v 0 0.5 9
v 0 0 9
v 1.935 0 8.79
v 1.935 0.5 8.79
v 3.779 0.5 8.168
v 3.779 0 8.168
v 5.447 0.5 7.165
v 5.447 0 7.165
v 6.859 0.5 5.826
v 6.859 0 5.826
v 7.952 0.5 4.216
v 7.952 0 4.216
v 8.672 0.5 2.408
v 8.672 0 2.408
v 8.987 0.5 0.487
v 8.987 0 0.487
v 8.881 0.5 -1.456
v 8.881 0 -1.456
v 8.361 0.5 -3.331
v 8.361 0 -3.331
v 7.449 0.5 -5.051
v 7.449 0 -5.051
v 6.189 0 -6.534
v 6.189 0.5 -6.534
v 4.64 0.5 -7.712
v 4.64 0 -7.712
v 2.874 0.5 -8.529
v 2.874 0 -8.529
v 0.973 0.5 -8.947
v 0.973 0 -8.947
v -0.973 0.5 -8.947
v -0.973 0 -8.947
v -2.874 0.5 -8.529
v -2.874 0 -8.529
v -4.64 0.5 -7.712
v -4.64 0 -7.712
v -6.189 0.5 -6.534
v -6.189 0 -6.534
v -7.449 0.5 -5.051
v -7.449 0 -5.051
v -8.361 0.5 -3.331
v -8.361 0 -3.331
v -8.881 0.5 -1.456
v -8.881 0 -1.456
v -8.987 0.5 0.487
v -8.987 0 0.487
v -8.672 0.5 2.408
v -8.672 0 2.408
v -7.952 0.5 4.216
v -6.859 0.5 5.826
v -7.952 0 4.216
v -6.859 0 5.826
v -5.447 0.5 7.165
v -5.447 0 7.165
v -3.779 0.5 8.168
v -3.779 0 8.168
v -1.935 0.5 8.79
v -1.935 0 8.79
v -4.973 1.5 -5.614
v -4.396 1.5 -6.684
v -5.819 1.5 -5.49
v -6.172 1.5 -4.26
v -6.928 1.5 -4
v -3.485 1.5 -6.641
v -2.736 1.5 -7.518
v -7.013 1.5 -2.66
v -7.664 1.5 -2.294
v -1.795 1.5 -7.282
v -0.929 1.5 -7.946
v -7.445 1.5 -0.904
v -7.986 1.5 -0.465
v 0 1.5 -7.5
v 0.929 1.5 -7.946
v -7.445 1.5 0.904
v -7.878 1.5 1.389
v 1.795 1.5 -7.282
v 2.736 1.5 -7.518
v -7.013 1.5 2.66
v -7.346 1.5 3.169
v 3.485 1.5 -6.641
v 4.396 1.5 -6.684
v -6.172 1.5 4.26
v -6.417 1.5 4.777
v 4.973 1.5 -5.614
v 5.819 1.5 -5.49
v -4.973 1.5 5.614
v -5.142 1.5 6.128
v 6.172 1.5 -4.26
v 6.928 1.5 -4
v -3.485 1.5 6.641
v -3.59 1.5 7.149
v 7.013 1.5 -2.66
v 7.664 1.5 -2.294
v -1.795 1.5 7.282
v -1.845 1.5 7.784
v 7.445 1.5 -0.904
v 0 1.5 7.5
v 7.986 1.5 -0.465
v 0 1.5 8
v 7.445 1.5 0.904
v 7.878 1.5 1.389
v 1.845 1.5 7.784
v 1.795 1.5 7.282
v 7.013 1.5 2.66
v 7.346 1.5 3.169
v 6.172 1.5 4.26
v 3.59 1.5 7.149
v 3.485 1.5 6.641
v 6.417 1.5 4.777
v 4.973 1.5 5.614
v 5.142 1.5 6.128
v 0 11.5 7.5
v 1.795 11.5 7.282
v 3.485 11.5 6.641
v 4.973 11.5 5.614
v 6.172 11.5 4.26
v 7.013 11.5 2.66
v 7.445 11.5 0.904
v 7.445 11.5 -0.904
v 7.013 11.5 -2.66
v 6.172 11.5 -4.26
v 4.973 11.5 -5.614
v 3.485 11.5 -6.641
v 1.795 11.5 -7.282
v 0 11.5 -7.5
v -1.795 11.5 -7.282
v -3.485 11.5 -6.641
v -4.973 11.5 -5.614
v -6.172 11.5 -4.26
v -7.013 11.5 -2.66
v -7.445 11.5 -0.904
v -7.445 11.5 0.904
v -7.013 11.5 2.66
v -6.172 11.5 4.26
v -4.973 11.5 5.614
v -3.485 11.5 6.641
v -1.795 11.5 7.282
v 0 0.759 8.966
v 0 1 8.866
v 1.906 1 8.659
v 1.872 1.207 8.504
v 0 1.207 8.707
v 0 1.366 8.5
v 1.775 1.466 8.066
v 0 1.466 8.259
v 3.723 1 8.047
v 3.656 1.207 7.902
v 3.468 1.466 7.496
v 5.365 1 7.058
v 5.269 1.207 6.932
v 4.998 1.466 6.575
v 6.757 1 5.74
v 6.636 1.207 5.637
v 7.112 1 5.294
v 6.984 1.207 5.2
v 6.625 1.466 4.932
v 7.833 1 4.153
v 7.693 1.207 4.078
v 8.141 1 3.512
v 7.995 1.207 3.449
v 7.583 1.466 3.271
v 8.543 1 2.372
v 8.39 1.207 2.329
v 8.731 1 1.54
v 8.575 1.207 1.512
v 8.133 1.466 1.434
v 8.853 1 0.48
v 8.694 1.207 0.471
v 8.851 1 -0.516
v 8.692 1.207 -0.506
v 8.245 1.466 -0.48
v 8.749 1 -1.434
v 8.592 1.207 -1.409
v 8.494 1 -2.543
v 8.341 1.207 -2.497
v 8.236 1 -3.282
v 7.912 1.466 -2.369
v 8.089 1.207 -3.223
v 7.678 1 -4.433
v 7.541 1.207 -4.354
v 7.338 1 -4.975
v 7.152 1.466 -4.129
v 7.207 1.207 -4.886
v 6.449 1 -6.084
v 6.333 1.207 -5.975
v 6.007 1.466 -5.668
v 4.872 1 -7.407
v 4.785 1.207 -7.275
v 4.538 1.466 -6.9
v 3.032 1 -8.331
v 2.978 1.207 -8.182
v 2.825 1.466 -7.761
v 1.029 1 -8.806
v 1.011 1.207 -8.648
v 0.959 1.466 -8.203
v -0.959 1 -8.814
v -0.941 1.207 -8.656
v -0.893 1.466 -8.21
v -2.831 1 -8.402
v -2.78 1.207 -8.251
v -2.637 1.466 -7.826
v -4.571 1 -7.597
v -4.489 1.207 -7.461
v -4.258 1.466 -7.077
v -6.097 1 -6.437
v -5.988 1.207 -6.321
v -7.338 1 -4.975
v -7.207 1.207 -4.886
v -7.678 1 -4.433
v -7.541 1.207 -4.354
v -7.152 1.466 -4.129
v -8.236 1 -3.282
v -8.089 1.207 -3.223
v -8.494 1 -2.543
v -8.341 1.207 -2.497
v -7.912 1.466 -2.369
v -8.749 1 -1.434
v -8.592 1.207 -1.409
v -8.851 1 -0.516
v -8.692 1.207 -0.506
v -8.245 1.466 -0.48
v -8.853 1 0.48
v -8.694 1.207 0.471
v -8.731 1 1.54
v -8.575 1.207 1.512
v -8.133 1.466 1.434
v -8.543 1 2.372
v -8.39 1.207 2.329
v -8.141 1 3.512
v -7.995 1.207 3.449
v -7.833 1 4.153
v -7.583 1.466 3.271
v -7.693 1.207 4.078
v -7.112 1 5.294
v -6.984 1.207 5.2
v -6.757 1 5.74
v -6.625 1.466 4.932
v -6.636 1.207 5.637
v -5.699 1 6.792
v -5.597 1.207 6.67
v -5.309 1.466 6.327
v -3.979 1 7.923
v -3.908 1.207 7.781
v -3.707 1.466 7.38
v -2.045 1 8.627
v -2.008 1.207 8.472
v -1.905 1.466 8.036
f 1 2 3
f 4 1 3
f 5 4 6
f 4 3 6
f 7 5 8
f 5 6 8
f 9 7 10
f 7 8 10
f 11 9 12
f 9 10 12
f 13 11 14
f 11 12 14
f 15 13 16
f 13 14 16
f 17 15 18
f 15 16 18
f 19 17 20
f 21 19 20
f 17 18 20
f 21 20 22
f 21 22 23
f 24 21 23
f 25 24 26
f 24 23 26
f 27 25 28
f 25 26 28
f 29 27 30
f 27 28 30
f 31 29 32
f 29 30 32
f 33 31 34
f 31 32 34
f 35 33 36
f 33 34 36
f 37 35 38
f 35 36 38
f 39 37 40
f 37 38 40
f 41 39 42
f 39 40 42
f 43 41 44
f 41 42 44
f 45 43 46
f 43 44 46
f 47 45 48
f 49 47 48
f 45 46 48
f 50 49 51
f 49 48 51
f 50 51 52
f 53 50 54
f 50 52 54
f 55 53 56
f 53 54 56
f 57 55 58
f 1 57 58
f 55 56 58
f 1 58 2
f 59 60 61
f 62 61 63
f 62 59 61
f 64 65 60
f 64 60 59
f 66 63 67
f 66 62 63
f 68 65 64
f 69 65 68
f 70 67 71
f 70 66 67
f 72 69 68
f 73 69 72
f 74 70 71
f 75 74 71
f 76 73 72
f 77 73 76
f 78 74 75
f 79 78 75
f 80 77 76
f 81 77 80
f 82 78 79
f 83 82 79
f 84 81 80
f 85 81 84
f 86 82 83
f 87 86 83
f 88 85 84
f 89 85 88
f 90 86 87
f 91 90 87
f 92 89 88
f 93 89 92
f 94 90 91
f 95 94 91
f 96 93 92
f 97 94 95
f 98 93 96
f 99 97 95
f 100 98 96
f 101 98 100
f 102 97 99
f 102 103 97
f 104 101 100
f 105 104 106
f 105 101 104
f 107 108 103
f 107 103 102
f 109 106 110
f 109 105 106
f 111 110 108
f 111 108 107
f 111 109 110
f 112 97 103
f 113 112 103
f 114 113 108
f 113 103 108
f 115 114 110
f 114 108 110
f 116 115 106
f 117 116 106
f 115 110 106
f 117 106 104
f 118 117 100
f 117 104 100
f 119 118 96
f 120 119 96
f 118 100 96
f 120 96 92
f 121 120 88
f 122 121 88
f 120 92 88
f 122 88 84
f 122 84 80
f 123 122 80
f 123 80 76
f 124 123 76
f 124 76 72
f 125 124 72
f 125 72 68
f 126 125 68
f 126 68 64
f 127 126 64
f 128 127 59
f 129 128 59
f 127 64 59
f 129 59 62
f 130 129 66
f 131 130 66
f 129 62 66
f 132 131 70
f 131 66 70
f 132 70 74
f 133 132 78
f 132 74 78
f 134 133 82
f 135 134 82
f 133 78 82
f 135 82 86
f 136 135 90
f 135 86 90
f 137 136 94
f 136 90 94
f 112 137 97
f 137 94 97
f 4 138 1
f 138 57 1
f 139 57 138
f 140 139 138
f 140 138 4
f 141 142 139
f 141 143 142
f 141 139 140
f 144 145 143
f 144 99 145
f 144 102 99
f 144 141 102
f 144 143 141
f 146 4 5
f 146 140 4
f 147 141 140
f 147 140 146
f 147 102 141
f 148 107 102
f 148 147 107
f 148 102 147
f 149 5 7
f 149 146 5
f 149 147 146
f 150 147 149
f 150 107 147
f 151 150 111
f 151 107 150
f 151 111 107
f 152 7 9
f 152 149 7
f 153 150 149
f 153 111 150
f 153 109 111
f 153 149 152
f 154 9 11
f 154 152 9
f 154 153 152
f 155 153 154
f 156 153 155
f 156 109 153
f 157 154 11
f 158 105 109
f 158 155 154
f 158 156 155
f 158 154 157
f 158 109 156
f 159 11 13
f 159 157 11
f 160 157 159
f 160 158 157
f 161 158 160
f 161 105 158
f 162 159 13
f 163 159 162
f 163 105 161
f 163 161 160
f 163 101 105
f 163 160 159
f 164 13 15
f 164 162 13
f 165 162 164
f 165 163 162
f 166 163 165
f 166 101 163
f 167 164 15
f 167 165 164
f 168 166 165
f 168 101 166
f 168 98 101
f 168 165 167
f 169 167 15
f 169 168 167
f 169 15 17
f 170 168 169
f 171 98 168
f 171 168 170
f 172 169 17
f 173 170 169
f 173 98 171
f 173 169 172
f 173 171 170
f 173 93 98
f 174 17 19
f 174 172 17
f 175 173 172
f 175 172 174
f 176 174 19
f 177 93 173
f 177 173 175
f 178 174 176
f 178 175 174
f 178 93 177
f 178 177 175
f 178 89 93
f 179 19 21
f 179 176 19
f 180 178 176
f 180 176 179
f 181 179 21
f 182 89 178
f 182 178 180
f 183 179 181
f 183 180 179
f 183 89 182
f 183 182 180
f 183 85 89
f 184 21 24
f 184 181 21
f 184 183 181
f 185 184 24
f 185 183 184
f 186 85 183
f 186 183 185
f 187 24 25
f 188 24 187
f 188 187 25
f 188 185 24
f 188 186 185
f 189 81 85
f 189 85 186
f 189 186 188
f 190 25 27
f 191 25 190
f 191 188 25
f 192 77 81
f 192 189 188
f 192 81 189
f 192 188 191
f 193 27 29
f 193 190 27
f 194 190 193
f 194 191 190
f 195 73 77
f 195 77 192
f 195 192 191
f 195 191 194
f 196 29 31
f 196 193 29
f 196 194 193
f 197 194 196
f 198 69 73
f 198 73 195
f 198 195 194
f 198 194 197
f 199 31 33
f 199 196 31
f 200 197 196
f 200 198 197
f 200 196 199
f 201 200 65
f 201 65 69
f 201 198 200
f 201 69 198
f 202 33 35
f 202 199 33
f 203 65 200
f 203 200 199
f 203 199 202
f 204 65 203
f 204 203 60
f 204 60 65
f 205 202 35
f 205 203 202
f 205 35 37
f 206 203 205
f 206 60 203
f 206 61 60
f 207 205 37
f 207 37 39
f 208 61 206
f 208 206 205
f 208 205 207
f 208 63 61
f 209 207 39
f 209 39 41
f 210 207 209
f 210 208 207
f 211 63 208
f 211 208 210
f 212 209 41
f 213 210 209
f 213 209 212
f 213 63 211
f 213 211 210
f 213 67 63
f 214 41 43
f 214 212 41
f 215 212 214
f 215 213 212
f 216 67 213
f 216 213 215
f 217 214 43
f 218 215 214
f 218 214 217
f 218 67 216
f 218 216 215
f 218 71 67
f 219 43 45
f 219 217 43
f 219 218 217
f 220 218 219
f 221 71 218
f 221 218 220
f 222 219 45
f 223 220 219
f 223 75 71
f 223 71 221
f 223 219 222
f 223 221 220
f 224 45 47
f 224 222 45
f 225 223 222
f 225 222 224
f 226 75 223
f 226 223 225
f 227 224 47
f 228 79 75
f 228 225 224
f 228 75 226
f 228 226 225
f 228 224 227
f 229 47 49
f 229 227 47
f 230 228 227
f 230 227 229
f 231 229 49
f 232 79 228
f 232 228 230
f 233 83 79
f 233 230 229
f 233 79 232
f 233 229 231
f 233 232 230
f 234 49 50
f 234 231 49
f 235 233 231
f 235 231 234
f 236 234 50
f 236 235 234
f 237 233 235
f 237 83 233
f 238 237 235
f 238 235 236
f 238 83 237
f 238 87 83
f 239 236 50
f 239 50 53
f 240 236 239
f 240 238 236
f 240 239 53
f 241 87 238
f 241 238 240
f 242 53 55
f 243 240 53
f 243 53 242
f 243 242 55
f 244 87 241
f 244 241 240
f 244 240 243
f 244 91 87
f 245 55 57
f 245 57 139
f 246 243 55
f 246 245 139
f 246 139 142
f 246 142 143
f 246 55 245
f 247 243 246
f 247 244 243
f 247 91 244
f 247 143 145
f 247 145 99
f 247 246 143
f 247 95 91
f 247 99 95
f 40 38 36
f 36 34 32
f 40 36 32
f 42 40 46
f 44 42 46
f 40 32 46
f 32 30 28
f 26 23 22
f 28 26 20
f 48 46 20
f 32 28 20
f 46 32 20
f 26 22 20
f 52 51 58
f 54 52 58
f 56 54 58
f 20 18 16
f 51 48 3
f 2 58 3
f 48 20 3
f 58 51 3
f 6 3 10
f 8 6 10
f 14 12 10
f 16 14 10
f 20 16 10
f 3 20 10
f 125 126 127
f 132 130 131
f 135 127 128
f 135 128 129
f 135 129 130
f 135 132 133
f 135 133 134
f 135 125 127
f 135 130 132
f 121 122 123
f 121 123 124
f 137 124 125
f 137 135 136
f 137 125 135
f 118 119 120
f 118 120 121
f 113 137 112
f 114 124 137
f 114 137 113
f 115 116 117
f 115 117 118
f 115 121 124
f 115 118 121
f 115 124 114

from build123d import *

# Parameters (mm, degrees)
ESBO_O1_R                = 9
RESSALTO_EXTRUS_O1_DEPTH = 1.5
FILETE1_R                = 1
ESBO_O2_R                = 7.5
RESSALTO_EXTRUS_O2_DEPTH = 10


with BuildPart() as part:
    # Esboço1 → Ressalto-extrusão1 (new body)
    with BuildSketch(Plane(origin=(0, 0, 0), x_dir=(1, 0, 0), z_dir=(0, 1, 0))):
        with Locations(Location((0, 0, 0), (0, 0, 270))):
            Circle(ESBO_O1_R)
    extrude(amount=RESSALTO_EXTRUS_O1_DEPTH)

    # Filete1
    filete1_edges = [part.edges().sort_by_distance(p)[0] for p in [
        (0, 1.5, -9),
    ]]
    fillet(filete1_edges, radius=FILETE1_R)

    # Esboço2 → Ressalto-extrusão2 (add)
    with BuildSketch(Plane(origin=(0, 1.5, 0), x_dir=(1, 0, 0), z_dir=(0, 1, 0))):
        with Locations(Location((0, 0, 0), (0, 0, 270))):
            Circle(ESBO_O2_R)
    extrude(amount=RESSALTO_EXTRUS_O2_DEPTH)


solid = part.part
